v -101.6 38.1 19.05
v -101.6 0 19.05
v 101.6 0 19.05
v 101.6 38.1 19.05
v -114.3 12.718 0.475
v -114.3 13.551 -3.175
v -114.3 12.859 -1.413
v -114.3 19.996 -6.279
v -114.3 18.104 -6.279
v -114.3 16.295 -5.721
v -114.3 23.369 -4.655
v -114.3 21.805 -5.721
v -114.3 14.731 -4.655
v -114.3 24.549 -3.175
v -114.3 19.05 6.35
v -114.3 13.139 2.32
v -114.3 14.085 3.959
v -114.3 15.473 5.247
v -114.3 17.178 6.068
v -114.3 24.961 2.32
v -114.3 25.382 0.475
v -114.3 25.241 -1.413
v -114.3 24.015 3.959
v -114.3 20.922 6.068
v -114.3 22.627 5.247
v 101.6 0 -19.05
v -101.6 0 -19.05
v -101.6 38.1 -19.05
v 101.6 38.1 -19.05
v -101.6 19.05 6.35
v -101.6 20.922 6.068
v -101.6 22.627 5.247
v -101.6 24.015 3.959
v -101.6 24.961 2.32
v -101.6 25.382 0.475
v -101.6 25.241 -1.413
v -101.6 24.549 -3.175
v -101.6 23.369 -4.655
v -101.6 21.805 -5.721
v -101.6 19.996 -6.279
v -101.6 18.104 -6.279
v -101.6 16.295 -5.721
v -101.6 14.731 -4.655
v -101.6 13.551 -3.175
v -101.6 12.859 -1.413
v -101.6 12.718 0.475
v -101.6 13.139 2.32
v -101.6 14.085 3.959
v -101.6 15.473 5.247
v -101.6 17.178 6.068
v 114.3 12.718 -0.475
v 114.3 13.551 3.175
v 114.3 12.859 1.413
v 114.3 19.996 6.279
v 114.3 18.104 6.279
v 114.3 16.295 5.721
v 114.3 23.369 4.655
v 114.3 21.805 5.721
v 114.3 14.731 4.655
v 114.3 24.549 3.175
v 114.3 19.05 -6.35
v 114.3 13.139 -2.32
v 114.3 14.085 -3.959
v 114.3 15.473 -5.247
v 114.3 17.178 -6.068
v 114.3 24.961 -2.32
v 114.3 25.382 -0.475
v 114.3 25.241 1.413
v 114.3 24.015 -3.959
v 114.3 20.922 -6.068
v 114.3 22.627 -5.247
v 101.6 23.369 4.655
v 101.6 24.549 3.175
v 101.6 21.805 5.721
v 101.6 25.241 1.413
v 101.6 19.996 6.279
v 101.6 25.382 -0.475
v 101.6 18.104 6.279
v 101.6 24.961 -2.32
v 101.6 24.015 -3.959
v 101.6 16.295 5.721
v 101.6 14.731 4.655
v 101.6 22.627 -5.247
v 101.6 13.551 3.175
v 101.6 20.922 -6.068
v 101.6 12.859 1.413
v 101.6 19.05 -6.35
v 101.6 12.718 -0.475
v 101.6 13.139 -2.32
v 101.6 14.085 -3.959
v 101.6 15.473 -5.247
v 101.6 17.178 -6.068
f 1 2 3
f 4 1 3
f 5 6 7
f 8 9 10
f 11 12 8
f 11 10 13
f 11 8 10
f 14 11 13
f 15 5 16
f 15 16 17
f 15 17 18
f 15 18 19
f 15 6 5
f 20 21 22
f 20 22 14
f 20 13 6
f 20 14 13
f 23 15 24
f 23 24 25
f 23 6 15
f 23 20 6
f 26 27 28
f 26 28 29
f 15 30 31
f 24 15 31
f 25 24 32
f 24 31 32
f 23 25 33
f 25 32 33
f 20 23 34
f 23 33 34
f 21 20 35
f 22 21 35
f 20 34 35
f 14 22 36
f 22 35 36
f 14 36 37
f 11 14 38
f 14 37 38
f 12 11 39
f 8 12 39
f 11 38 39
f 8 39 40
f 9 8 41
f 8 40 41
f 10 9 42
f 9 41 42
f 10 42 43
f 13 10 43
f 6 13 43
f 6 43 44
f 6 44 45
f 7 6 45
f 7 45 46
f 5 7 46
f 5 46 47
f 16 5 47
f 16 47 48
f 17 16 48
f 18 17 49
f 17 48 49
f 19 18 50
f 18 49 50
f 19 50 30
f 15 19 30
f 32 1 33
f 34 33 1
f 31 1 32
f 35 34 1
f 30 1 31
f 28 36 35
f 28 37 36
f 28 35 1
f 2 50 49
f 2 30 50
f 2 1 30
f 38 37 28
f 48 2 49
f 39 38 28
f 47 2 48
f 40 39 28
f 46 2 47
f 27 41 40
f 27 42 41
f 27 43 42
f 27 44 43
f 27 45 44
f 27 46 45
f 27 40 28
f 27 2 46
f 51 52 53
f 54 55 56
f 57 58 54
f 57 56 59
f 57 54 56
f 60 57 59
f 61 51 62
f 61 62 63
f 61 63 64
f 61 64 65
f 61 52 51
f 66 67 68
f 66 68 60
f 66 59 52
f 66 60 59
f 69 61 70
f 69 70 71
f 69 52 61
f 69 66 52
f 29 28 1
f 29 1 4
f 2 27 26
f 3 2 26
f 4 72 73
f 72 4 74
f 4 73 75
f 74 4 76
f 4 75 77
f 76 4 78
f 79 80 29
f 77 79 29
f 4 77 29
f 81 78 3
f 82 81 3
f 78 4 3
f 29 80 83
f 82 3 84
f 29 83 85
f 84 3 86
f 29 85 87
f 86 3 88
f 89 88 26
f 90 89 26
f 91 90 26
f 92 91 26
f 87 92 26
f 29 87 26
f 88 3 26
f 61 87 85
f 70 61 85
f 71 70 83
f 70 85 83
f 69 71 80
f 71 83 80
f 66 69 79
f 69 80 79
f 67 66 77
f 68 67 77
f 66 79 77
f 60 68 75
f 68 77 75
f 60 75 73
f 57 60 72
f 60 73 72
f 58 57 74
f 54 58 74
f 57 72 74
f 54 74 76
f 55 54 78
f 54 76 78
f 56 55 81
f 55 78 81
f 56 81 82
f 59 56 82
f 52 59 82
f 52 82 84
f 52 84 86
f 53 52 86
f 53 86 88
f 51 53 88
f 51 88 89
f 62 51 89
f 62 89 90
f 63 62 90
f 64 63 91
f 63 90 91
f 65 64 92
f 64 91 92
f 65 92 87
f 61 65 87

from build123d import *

# Parameters (mm, degrees)
CROQUIS1_W              = 203.2
CROQUIS1_H              = 38.1
SALIENTE_EXTRUIR2_DEPTH = 38.1
CROQUIS2_R              = 6.35
SALIENTE_EXTRUIR3_DEPTH = 12.7
CROQUIS3_R              = 6.35
SALIENTE_EXTRUIR4_DEPTH = 12.7


with BuildPart() as part:
    # Croquis1 → Saliente-Extruir2 (new body)
    with BuildSketch(Plane(origin=(0, 0, 0), x_dir=(1, 0, 0), z_dir=(0, 1, 0))):
        Rectangle(CROQUIS1_W, CROQUIS1_H)
    extrude(amount=SALIENTE_EXTRUIR2_DEPTH)

    # Croquis2 → Saliente-Extruir3 (add)
    with BuildSketch(Plane(origin=(101.6, 0, 0), x_dir=(0, 0, -1), z_dir=(1, 0, 0))):
        with Locations((0, 19.05)):
            Circle(CROQUIS2_R)
    extrude(amount=SALIENTE_EXTRUIR3_DEPTH)

    # Croquis3 → Saliente-Extruir4 (add)
    with BuildSketch(Plane.ZY.offset(101.6)):
        with Locations((0, 19.05)):
            Circle(CROQUIS3_R)
    extrude(amount=SALIENTE_EXTRUIR4_DEPTH)


solid = part.part
